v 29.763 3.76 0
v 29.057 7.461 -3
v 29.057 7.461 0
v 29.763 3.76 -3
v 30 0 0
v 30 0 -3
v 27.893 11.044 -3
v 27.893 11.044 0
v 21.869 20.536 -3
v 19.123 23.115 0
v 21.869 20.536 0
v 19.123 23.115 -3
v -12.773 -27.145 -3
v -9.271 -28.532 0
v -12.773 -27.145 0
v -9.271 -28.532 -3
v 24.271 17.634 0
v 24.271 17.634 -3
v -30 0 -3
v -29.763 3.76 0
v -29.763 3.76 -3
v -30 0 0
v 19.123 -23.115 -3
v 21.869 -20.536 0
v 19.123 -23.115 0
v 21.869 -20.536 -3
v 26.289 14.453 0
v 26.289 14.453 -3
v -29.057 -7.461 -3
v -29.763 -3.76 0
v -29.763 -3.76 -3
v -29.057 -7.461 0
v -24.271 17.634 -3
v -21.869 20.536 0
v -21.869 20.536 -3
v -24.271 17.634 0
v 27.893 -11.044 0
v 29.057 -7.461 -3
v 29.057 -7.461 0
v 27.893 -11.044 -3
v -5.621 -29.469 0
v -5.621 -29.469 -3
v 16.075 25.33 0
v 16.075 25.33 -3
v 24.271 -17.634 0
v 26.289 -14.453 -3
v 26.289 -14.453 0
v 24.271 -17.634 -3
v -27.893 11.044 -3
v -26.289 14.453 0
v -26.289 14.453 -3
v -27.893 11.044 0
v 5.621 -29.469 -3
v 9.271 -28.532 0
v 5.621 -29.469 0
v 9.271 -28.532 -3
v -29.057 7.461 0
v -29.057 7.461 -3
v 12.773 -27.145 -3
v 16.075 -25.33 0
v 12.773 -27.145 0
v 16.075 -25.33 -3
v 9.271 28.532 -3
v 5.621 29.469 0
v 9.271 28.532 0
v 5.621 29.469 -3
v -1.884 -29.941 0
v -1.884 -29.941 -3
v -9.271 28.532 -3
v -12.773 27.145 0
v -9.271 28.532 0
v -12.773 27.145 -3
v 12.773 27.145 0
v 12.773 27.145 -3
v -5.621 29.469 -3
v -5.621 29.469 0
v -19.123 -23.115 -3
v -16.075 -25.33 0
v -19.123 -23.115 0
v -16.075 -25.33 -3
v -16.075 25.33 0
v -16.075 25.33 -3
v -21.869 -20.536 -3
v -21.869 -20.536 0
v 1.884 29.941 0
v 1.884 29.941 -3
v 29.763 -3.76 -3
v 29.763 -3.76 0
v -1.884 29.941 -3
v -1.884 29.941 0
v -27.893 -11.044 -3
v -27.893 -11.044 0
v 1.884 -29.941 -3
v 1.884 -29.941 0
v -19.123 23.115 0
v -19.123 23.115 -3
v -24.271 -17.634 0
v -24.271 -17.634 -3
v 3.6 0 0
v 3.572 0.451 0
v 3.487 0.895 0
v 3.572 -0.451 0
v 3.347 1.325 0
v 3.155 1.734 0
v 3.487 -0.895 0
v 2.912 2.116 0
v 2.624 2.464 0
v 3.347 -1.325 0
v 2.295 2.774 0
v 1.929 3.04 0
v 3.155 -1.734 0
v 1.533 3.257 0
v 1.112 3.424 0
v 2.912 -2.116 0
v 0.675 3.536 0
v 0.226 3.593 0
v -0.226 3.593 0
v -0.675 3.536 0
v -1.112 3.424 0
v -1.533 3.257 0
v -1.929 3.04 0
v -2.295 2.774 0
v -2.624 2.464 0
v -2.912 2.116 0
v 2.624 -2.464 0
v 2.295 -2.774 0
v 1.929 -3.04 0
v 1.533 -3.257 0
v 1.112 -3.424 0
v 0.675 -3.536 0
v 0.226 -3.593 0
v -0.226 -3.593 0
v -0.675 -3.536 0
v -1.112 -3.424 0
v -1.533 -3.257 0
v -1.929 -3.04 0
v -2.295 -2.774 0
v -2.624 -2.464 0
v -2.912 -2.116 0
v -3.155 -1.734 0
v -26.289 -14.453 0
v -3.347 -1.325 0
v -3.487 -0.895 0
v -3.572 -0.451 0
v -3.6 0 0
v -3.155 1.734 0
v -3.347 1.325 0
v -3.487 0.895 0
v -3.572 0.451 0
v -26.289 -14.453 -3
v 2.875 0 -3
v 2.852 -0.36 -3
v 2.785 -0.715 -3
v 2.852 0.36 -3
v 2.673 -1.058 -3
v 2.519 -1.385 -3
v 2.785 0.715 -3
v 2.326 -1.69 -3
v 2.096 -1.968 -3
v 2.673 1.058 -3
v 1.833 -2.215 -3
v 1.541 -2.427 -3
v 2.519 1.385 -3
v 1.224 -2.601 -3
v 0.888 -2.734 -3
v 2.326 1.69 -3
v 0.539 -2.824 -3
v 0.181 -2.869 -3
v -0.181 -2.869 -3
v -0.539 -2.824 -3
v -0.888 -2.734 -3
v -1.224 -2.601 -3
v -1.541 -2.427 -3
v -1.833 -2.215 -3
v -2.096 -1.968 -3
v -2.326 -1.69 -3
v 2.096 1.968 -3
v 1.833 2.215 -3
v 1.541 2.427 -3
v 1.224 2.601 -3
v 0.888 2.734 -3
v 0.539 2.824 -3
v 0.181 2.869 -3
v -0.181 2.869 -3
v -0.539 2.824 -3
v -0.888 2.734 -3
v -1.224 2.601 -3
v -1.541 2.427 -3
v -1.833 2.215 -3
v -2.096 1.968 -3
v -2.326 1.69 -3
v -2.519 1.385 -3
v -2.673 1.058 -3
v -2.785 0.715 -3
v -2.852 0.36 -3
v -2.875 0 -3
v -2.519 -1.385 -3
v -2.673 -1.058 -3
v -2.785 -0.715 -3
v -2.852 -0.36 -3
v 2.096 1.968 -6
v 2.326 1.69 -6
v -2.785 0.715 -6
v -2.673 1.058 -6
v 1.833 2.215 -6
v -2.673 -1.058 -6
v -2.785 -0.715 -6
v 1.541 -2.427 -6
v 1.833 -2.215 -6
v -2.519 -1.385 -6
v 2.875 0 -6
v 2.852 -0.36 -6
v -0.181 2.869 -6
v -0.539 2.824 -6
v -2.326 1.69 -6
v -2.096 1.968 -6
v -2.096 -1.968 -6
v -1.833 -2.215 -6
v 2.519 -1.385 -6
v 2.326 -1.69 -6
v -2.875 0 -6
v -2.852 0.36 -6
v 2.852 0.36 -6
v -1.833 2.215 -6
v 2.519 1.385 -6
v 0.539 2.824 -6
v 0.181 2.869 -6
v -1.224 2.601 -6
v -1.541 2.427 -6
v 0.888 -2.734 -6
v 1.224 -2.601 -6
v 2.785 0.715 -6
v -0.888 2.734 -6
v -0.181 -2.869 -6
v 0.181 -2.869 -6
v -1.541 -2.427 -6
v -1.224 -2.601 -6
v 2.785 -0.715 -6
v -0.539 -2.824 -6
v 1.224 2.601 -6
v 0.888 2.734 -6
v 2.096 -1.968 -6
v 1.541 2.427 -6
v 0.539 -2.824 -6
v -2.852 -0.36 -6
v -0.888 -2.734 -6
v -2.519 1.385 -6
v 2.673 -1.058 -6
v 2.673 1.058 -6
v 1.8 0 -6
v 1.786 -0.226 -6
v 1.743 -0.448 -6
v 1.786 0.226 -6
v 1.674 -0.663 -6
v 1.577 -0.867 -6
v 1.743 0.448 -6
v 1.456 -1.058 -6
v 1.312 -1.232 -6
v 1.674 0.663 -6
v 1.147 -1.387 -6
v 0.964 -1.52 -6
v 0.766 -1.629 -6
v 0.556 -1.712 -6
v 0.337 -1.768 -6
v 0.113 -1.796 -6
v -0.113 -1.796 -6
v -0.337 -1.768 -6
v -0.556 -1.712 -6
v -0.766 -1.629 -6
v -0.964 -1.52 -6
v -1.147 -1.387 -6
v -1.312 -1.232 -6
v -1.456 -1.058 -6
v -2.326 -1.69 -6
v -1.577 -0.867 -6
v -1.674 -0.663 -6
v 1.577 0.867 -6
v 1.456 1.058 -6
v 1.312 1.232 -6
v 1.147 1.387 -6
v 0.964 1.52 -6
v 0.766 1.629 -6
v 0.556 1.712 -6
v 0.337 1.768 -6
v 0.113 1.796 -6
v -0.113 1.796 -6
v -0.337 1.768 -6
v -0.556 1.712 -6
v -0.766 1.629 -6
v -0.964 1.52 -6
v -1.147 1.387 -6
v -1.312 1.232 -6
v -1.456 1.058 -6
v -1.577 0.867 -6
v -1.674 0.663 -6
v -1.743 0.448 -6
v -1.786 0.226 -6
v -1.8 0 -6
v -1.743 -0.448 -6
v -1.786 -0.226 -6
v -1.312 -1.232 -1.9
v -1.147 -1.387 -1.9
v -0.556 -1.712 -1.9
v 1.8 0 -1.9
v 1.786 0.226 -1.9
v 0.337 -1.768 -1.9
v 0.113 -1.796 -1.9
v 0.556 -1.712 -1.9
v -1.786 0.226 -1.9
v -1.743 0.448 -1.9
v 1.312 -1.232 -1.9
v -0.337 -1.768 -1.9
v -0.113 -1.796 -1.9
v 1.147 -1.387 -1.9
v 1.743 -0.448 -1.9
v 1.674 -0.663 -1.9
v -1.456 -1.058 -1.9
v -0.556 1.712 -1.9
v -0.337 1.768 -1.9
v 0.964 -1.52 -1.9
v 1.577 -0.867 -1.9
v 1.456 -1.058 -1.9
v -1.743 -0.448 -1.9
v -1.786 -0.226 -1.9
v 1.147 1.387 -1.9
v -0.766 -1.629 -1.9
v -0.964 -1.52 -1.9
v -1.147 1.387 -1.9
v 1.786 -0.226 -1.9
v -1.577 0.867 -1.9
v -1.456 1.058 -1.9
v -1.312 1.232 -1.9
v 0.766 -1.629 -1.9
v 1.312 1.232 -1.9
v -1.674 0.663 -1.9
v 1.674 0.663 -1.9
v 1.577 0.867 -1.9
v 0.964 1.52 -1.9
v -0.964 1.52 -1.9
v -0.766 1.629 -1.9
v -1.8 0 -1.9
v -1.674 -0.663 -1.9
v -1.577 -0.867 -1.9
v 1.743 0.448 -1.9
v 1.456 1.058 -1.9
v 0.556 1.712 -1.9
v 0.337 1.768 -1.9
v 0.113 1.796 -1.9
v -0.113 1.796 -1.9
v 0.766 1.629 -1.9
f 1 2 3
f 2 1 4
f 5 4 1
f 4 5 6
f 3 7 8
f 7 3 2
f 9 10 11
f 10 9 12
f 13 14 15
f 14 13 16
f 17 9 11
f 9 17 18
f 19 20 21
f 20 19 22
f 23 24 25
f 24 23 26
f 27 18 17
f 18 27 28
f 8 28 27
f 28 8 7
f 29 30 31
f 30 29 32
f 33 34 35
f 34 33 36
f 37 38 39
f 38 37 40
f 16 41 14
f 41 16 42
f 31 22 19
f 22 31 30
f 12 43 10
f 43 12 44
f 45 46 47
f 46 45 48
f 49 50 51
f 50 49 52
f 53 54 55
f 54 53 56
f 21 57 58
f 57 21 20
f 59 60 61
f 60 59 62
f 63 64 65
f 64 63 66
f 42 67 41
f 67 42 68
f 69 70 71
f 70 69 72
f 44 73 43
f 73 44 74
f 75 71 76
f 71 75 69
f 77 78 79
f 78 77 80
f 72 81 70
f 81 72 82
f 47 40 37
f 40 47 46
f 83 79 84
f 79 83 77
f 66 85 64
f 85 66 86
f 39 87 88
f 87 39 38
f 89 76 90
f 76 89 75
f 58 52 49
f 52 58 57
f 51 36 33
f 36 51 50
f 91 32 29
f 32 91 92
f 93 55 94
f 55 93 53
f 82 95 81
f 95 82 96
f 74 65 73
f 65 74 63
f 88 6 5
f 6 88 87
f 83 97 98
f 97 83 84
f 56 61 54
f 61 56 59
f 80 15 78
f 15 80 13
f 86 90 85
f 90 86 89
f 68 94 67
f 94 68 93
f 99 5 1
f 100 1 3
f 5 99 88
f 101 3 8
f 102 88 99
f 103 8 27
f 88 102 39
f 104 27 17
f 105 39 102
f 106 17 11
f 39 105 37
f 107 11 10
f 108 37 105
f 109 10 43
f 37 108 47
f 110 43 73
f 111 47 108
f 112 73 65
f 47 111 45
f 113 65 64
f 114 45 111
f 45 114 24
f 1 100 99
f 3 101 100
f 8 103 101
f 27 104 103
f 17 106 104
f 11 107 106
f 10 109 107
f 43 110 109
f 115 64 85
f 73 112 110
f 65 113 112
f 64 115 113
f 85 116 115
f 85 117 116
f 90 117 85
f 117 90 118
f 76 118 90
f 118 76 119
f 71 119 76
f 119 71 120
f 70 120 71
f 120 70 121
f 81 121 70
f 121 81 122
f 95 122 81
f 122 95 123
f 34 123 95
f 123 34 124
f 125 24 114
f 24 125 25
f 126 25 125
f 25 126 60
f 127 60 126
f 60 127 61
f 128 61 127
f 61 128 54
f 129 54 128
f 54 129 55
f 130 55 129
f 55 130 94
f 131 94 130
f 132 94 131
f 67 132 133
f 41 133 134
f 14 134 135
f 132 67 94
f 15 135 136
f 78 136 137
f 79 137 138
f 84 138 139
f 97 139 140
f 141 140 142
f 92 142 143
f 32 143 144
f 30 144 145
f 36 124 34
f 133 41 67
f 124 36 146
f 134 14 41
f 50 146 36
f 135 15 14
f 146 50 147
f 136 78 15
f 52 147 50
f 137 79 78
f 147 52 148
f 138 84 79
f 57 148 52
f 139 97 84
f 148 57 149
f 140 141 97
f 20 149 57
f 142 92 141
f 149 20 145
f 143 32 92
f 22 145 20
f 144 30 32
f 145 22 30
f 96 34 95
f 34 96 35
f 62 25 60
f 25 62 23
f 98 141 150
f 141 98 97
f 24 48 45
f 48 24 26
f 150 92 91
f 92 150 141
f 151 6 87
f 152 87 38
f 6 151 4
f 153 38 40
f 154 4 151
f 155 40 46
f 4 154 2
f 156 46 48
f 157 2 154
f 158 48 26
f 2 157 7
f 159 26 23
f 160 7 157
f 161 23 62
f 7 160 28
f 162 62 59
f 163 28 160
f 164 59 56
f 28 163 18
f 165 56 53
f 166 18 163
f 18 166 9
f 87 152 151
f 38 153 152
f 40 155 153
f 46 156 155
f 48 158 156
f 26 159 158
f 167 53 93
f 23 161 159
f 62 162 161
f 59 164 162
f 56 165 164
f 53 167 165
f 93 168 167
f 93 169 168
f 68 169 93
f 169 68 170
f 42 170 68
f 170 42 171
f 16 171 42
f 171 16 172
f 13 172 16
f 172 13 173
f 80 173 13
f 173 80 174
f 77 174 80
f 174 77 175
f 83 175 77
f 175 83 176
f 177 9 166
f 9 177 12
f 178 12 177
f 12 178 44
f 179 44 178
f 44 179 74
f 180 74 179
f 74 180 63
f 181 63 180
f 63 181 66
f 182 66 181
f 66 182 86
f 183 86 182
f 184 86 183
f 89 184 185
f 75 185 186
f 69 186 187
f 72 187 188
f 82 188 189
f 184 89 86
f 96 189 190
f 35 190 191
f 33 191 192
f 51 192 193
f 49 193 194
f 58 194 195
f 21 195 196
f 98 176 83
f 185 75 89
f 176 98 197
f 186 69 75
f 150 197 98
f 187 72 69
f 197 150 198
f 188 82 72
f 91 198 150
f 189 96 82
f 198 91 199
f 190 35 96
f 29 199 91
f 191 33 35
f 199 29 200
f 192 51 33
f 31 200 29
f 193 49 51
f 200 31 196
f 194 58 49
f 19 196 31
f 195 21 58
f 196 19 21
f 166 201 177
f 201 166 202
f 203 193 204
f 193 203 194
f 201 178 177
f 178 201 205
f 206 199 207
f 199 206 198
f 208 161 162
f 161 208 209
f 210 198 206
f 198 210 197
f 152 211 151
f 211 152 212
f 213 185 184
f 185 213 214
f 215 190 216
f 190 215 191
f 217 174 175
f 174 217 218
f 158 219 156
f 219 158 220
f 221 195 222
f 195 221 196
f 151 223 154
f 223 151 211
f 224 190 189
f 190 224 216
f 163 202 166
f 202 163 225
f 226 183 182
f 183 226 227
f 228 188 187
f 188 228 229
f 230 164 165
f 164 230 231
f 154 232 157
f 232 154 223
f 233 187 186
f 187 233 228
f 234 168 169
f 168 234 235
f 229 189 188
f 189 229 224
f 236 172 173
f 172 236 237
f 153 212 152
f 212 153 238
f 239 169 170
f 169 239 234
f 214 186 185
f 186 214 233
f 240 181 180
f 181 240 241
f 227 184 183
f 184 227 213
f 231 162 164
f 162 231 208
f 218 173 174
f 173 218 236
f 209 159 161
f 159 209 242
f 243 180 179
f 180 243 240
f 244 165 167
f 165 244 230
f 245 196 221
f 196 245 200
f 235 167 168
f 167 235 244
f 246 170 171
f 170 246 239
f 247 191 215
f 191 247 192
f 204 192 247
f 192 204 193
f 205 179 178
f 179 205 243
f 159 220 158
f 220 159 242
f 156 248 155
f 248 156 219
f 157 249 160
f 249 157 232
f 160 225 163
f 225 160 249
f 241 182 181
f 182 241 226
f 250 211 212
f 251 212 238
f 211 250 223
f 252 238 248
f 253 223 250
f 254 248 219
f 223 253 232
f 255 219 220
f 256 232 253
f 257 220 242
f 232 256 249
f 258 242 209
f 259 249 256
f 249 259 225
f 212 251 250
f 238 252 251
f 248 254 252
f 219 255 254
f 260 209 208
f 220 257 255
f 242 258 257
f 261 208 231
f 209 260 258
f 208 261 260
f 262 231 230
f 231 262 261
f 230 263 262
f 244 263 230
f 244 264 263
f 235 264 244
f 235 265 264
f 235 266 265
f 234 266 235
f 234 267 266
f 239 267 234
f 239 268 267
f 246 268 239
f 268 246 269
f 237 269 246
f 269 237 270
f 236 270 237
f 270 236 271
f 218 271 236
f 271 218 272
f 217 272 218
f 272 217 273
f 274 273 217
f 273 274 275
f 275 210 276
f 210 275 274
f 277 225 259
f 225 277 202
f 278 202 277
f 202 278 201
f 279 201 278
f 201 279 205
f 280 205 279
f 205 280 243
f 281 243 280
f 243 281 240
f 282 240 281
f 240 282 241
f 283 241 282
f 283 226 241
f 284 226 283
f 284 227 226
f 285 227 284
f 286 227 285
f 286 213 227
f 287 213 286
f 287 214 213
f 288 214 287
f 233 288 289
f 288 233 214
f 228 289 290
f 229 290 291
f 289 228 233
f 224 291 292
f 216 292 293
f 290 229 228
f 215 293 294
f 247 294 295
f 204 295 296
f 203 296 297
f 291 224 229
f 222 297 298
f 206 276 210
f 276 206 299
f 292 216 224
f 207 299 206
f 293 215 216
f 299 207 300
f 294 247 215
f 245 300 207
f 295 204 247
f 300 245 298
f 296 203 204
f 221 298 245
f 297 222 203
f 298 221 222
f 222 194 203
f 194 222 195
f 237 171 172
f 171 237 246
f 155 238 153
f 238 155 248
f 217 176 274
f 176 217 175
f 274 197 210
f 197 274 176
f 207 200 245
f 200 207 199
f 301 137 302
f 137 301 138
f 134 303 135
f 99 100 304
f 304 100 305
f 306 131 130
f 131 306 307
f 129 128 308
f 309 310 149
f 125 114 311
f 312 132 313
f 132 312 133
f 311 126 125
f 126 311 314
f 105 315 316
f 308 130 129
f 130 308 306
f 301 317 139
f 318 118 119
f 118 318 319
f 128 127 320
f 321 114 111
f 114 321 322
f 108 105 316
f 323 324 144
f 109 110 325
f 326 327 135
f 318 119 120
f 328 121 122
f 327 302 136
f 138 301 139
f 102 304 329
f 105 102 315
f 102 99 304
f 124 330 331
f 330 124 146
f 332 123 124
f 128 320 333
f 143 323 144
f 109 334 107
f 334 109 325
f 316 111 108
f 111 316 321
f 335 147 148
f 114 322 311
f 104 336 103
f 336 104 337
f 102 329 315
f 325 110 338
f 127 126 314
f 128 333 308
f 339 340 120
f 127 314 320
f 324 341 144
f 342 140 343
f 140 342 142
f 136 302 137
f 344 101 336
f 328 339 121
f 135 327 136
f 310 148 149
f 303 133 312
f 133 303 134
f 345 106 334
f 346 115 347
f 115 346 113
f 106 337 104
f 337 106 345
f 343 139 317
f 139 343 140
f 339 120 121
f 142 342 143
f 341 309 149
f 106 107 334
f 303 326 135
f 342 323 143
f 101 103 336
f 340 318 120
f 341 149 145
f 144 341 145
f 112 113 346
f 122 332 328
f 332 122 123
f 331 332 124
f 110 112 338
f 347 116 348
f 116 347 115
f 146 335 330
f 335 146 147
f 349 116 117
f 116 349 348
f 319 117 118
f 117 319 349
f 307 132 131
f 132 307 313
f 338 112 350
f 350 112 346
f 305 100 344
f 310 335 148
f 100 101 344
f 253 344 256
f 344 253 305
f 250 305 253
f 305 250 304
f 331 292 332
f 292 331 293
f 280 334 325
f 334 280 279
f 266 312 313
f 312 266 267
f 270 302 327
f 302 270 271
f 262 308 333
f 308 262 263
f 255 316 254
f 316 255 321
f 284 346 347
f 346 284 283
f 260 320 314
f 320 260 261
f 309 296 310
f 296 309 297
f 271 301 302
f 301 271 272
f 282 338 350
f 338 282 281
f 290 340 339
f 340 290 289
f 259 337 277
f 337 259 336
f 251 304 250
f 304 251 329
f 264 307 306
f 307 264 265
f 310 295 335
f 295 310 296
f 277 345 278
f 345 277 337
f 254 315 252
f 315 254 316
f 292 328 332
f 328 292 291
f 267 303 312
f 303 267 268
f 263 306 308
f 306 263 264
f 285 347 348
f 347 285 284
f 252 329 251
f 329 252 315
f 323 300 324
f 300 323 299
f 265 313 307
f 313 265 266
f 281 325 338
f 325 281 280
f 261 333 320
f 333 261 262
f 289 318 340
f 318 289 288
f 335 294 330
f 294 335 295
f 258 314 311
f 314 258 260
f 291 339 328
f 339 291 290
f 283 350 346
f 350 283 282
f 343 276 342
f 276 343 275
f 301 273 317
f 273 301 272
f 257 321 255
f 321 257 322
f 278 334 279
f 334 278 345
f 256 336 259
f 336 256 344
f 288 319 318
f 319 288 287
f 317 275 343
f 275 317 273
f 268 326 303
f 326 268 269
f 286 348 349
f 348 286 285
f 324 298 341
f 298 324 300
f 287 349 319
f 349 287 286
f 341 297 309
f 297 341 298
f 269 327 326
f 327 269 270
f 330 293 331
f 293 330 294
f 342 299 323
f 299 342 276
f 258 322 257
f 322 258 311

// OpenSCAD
$fn = 50;


difference() {
	union() {
		translate(v = [0, 0, -3.0000000000]) {
			cylinder(h = 3, r = 30.0000000000);
		}
		#translate(v = [0, 0, -6.0000000000]) {
			cylinder(h = 6, r = 2.8750000000);
		}
	}
	union() {
		translate(v = [0, 0, 0]) {
			rotate(a = [0, 0, 0]) {
				difference() {
					union() {
						translate(v = [0, 0, -6.0000000000]) {
							cylinder(h = 6, r = 1.5000000000);
						}
						translate(v = [0, 0, -1.9000000000]) {
							cylinder(h = 1.9000000000, r1 = 1.8000000000, r2 = 3.6000000000);
						}
						translate(v = [0, 0, -6.0000000000]) {
							cylinder(h = 6, r = 1.8000000000);
						}
						translate(v = [0, 0, -6.0000000000]) {
							cylinder(h = 6, r = 1.5000000000);
						}
					}
					union();
				}
			}
		}
	}
}
